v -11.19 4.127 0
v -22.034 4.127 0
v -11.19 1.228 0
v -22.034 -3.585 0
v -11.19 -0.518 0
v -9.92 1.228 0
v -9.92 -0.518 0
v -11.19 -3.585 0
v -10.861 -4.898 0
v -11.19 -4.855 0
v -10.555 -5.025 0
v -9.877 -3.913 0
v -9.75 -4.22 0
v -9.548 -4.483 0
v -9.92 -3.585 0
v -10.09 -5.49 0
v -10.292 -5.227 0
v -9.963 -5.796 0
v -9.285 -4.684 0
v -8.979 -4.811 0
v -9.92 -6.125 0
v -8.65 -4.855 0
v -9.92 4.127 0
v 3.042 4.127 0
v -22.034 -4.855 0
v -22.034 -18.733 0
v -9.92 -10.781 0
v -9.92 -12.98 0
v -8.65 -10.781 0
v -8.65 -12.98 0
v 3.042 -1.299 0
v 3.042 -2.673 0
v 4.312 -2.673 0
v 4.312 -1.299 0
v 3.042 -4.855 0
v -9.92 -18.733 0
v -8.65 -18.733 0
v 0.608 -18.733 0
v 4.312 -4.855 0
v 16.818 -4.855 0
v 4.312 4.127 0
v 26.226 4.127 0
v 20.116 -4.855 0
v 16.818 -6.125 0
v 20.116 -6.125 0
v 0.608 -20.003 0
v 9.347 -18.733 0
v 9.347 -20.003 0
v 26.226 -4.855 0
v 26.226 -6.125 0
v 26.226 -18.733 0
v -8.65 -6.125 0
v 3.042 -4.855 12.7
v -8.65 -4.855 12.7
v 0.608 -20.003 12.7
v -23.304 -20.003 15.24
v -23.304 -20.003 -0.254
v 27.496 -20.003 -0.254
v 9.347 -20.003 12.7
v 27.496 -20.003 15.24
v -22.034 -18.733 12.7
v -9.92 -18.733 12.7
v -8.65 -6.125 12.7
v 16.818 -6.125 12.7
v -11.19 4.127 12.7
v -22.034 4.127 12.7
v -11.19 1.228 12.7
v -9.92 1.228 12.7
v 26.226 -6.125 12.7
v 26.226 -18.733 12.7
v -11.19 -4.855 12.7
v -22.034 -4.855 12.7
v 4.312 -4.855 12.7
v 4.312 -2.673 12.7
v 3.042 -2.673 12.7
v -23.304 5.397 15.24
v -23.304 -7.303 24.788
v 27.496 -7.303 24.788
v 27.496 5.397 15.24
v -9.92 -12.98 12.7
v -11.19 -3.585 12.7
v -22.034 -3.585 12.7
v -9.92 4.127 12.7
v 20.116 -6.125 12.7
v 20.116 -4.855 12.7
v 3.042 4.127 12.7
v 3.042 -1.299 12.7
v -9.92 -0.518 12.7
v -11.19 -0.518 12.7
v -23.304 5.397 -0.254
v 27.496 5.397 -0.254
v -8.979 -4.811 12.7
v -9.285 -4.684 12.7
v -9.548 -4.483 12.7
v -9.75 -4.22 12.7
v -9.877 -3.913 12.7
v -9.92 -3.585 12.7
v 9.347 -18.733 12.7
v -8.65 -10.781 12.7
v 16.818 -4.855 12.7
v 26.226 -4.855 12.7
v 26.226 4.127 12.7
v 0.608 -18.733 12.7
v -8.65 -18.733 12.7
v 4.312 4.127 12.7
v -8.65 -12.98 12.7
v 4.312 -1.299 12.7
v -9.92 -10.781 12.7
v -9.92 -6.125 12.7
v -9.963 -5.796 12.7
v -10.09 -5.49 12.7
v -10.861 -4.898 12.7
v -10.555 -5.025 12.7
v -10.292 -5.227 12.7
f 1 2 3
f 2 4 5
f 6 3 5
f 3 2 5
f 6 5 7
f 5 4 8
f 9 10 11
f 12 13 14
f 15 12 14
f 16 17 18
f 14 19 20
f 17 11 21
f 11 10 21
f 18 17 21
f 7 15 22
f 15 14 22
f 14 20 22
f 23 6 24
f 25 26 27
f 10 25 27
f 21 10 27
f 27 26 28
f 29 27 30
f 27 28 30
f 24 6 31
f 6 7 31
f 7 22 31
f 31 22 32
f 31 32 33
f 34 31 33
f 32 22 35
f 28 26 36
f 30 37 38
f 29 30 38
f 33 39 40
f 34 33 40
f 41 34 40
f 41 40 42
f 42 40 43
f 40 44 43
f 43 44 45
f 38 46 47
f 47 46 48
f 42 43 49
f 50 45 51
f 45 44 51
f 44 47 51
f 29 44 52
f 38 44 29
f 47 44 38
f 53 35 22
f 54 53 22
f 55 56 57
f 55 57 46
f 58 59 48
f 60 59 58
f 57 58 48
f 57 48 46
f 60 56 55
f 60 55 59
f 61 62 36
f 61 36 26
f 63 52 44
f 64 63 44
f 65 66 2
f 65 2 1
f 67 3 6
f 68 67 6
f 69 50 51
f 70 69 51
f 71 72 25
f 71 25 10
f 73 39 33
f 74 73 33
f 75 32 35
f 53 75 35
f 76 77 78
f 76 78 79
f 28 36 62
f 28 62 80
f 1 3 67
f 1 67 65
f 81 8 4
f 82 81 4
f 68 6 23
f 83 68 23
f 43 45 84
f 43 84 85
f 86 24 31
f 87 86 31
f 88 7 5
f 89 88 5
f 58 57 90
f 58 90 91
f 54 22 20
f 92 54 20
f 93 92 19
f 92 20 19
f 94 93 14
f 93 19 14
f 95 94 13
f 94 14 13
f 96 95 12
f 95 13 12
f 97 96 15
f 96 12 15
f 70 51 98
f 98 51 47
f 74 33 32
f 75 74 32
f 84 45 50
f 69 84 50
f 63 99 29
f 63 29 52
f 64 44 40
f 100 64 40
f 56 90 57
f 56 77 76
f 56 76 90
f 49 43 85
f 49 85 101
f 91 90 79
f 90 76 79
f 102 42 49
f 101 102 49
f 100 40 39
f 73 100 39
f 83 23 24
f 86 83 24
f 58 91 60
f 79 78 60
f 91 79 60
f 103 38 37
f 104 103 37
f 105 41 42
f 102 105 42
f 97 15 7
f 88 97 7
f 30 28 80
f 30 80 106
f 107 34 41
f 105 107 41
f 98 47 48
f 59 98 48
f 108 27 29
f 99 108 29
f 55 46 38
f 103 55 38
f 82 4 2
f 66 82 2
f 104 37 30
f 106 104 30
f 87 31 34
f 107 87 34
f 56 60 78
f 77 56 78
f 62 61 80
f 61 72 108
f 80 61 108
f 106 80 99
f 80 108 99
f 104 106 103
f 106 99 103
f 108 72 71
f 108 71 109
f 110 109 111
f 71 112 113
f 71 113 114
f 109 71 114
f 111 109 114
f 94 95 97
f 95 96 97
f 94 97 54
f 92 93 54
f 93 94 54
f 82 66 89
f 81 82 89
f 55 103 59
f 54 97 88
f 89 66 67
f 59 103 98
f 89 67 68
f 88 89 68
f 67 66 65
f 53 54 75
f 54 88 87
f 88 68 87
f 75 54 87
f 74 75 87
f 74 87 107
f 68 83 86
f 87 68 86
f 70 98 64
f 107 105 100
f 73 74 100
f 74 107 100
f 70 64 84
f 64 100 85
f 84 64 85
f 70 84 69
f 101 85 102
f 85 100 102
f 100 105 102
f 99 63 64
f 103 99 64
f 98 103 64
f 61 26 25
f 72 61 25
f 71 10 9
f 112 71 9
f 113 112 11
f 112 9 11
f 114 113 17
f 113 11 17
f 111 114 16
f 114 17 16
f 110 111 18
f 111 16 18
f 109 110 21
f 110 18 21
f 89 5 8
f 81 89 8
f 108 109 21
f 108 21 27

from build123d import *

# Parameters (mm, degrees)
F0_W     = 1.27
F0_H     = 5.7522215727
F0_W_2   = 6.1100403625
F0_H_2   = 1.27
F0_H_3   = 2.8992746613
F1_DEPTH = 12.7
F2_W     = 50.8
F2_H     = 25.4
F3_DEPTH = 2.54
F5_DEPTH = 50.8
F6_W     = 50.8
F6_H     = 25.4
F7_DEPTH = 0.254


with BuildPart() as f1:
    # F0 (on Top) → F1 (new body)
    with BuildSketch(Plane.XY):
        Polygon((27.4962335825, 5.3974989146), (-23.3037664175, 5.3974989146), (-23.3037664175, -20.0025010854), (0.6083042244, -20.0025010854), (0.6083042244, -18.7325010854), (-8.6501812091, -18.7325010854), (-9.9201812091, -18.7325010854), (-22.0337664175, -18.7325010854), (-22.0337664175, -4.8546069302), (-22.0337664175, -3.5846069302), (-22.0337664175, 4.1274989146), (-11.1901812091, 4.1274989146), (-9.9201812091, 4.1274989146), (3.0415252629, 4.1274989146), (3.0415252629, -1.2985680951), (4.3115252629, -1.2985680951), (4.3115252629, 4.1274989146), (26.2262335825, 4.1274989146), (26.2262335825, -4.8546069302), (26.2262335825, -6.1246069302), (26.2262335825, -18.7325010854), (9.3469638377, -18.7325010854), (9.3469638377, -20.0025010854), (27.4962335825, -20.0025010854), align=None)
        with Locations((-9.2851812091, -15.8563902991)):
            Rectangle(F0_W, F0_H)
        with Locations((23.1712134013, -5.4896069302)):
            Rectangle(F0_W_2, F0_H_2)
        with BuildLine():
            Line((-22.0337664175, -3.5846069302), (-22.0337664175, -4.8546069302))
            Line((-22.0337664175, -4.8546069302), (-11.1901812091, -4.8546069302))
            ThreePointArc((-11.1901812091, -4.8546069302), (-10.292155597, -5.2265813181), (-9.9201812091, -6.1246069302))
            Line((-9.9201812091, -6.1246069302), (-9.9201812091, -10.781369172))
            Line((-9.9201812091, -10.781369172), (-8.6501812091, -10.781369172))
            Line((-8.6501812091, -10.781369172), (-8.6501812091, -6.1246069302))
            Line((-8.6501812091, -6.1246069302), (16.8178286403, -6.1246069302))
            Line((16.8178286403, -6.1246069302), (16.8178286403, -4.8546069302))
            Line((16.8178286403, -4.8546069302), (4.3115252629, -4.8546069302))
            Line((4.3115252629, -4.8546069302), (4.3115252629, -2.6728871744))
            Line((4.3115252629, -2.6728871744), (3.0415252629, -2.6728871744))
            Line((3.0415252629, -2.6728871744), (3.0415252629, -4.8546069302))
            Line((3.0415252629, -4.8546069302), (-8.6501812091, -4.8546069302))
            ThreePointArc((-8.6501812091, -4.8546069302), (-9.5482068213, -4.4826325423), (-9.9201812091, -3.5846069302))
            Line((-9.9201812091, -3.5846069302), (-9.9201812091, -0.5181303131))
            Line((-9.9201812091, -0.5181303131), (-11.1901812091, -0.5181303131))
            Line((-11.1901812091, -0.5181303131), (-11.1901812091, -3.5846069302))
            Line((-11.1901812091, -3.5846069302), (-22.0337664175, -3.5846069302))
        make_face()
        with Locations((-10.5551812091, 2.6778615839)):
            Rectangle(F0_W, F0_H_3)
    extrude(amount=F1_DEPTH)

    # F2 (on face) → F3 (join)
    with BuildSketch(Plane.XY.offset(12.7)):
        with Locations((2.0962335825, -7.3025010854)):
            Rectangle(F2_W, F2_H)
    extrude(amount=F3_DEPTH)

    # F4 (on face) → F5 (join)
    with BuildSketch(Plane(origin=(-23.3037664175, 0, 0), x_dir=(0, -1, 0), z_dir=(-1, 0, 0))):
        Polygon((7.3025010854, 24.7875675559), (-5.3974989146, 15.24), (20.0025010854, 15.24), align=None)
    extrude(amount=-F5_DEPTH)

    # F6 (on face) → F7 (join)
    with BuildSketch(Plane(origin=(0, 0, 0), x_dir=(1, 0, 0), z_dir=(0, 0, -1))):
        with Locations((2.0962335825, 7.3025010854)):
            Rectangle(F6_W, F6_H)
    extrude(amount=F7_DEPTH)


solid = f1.part
